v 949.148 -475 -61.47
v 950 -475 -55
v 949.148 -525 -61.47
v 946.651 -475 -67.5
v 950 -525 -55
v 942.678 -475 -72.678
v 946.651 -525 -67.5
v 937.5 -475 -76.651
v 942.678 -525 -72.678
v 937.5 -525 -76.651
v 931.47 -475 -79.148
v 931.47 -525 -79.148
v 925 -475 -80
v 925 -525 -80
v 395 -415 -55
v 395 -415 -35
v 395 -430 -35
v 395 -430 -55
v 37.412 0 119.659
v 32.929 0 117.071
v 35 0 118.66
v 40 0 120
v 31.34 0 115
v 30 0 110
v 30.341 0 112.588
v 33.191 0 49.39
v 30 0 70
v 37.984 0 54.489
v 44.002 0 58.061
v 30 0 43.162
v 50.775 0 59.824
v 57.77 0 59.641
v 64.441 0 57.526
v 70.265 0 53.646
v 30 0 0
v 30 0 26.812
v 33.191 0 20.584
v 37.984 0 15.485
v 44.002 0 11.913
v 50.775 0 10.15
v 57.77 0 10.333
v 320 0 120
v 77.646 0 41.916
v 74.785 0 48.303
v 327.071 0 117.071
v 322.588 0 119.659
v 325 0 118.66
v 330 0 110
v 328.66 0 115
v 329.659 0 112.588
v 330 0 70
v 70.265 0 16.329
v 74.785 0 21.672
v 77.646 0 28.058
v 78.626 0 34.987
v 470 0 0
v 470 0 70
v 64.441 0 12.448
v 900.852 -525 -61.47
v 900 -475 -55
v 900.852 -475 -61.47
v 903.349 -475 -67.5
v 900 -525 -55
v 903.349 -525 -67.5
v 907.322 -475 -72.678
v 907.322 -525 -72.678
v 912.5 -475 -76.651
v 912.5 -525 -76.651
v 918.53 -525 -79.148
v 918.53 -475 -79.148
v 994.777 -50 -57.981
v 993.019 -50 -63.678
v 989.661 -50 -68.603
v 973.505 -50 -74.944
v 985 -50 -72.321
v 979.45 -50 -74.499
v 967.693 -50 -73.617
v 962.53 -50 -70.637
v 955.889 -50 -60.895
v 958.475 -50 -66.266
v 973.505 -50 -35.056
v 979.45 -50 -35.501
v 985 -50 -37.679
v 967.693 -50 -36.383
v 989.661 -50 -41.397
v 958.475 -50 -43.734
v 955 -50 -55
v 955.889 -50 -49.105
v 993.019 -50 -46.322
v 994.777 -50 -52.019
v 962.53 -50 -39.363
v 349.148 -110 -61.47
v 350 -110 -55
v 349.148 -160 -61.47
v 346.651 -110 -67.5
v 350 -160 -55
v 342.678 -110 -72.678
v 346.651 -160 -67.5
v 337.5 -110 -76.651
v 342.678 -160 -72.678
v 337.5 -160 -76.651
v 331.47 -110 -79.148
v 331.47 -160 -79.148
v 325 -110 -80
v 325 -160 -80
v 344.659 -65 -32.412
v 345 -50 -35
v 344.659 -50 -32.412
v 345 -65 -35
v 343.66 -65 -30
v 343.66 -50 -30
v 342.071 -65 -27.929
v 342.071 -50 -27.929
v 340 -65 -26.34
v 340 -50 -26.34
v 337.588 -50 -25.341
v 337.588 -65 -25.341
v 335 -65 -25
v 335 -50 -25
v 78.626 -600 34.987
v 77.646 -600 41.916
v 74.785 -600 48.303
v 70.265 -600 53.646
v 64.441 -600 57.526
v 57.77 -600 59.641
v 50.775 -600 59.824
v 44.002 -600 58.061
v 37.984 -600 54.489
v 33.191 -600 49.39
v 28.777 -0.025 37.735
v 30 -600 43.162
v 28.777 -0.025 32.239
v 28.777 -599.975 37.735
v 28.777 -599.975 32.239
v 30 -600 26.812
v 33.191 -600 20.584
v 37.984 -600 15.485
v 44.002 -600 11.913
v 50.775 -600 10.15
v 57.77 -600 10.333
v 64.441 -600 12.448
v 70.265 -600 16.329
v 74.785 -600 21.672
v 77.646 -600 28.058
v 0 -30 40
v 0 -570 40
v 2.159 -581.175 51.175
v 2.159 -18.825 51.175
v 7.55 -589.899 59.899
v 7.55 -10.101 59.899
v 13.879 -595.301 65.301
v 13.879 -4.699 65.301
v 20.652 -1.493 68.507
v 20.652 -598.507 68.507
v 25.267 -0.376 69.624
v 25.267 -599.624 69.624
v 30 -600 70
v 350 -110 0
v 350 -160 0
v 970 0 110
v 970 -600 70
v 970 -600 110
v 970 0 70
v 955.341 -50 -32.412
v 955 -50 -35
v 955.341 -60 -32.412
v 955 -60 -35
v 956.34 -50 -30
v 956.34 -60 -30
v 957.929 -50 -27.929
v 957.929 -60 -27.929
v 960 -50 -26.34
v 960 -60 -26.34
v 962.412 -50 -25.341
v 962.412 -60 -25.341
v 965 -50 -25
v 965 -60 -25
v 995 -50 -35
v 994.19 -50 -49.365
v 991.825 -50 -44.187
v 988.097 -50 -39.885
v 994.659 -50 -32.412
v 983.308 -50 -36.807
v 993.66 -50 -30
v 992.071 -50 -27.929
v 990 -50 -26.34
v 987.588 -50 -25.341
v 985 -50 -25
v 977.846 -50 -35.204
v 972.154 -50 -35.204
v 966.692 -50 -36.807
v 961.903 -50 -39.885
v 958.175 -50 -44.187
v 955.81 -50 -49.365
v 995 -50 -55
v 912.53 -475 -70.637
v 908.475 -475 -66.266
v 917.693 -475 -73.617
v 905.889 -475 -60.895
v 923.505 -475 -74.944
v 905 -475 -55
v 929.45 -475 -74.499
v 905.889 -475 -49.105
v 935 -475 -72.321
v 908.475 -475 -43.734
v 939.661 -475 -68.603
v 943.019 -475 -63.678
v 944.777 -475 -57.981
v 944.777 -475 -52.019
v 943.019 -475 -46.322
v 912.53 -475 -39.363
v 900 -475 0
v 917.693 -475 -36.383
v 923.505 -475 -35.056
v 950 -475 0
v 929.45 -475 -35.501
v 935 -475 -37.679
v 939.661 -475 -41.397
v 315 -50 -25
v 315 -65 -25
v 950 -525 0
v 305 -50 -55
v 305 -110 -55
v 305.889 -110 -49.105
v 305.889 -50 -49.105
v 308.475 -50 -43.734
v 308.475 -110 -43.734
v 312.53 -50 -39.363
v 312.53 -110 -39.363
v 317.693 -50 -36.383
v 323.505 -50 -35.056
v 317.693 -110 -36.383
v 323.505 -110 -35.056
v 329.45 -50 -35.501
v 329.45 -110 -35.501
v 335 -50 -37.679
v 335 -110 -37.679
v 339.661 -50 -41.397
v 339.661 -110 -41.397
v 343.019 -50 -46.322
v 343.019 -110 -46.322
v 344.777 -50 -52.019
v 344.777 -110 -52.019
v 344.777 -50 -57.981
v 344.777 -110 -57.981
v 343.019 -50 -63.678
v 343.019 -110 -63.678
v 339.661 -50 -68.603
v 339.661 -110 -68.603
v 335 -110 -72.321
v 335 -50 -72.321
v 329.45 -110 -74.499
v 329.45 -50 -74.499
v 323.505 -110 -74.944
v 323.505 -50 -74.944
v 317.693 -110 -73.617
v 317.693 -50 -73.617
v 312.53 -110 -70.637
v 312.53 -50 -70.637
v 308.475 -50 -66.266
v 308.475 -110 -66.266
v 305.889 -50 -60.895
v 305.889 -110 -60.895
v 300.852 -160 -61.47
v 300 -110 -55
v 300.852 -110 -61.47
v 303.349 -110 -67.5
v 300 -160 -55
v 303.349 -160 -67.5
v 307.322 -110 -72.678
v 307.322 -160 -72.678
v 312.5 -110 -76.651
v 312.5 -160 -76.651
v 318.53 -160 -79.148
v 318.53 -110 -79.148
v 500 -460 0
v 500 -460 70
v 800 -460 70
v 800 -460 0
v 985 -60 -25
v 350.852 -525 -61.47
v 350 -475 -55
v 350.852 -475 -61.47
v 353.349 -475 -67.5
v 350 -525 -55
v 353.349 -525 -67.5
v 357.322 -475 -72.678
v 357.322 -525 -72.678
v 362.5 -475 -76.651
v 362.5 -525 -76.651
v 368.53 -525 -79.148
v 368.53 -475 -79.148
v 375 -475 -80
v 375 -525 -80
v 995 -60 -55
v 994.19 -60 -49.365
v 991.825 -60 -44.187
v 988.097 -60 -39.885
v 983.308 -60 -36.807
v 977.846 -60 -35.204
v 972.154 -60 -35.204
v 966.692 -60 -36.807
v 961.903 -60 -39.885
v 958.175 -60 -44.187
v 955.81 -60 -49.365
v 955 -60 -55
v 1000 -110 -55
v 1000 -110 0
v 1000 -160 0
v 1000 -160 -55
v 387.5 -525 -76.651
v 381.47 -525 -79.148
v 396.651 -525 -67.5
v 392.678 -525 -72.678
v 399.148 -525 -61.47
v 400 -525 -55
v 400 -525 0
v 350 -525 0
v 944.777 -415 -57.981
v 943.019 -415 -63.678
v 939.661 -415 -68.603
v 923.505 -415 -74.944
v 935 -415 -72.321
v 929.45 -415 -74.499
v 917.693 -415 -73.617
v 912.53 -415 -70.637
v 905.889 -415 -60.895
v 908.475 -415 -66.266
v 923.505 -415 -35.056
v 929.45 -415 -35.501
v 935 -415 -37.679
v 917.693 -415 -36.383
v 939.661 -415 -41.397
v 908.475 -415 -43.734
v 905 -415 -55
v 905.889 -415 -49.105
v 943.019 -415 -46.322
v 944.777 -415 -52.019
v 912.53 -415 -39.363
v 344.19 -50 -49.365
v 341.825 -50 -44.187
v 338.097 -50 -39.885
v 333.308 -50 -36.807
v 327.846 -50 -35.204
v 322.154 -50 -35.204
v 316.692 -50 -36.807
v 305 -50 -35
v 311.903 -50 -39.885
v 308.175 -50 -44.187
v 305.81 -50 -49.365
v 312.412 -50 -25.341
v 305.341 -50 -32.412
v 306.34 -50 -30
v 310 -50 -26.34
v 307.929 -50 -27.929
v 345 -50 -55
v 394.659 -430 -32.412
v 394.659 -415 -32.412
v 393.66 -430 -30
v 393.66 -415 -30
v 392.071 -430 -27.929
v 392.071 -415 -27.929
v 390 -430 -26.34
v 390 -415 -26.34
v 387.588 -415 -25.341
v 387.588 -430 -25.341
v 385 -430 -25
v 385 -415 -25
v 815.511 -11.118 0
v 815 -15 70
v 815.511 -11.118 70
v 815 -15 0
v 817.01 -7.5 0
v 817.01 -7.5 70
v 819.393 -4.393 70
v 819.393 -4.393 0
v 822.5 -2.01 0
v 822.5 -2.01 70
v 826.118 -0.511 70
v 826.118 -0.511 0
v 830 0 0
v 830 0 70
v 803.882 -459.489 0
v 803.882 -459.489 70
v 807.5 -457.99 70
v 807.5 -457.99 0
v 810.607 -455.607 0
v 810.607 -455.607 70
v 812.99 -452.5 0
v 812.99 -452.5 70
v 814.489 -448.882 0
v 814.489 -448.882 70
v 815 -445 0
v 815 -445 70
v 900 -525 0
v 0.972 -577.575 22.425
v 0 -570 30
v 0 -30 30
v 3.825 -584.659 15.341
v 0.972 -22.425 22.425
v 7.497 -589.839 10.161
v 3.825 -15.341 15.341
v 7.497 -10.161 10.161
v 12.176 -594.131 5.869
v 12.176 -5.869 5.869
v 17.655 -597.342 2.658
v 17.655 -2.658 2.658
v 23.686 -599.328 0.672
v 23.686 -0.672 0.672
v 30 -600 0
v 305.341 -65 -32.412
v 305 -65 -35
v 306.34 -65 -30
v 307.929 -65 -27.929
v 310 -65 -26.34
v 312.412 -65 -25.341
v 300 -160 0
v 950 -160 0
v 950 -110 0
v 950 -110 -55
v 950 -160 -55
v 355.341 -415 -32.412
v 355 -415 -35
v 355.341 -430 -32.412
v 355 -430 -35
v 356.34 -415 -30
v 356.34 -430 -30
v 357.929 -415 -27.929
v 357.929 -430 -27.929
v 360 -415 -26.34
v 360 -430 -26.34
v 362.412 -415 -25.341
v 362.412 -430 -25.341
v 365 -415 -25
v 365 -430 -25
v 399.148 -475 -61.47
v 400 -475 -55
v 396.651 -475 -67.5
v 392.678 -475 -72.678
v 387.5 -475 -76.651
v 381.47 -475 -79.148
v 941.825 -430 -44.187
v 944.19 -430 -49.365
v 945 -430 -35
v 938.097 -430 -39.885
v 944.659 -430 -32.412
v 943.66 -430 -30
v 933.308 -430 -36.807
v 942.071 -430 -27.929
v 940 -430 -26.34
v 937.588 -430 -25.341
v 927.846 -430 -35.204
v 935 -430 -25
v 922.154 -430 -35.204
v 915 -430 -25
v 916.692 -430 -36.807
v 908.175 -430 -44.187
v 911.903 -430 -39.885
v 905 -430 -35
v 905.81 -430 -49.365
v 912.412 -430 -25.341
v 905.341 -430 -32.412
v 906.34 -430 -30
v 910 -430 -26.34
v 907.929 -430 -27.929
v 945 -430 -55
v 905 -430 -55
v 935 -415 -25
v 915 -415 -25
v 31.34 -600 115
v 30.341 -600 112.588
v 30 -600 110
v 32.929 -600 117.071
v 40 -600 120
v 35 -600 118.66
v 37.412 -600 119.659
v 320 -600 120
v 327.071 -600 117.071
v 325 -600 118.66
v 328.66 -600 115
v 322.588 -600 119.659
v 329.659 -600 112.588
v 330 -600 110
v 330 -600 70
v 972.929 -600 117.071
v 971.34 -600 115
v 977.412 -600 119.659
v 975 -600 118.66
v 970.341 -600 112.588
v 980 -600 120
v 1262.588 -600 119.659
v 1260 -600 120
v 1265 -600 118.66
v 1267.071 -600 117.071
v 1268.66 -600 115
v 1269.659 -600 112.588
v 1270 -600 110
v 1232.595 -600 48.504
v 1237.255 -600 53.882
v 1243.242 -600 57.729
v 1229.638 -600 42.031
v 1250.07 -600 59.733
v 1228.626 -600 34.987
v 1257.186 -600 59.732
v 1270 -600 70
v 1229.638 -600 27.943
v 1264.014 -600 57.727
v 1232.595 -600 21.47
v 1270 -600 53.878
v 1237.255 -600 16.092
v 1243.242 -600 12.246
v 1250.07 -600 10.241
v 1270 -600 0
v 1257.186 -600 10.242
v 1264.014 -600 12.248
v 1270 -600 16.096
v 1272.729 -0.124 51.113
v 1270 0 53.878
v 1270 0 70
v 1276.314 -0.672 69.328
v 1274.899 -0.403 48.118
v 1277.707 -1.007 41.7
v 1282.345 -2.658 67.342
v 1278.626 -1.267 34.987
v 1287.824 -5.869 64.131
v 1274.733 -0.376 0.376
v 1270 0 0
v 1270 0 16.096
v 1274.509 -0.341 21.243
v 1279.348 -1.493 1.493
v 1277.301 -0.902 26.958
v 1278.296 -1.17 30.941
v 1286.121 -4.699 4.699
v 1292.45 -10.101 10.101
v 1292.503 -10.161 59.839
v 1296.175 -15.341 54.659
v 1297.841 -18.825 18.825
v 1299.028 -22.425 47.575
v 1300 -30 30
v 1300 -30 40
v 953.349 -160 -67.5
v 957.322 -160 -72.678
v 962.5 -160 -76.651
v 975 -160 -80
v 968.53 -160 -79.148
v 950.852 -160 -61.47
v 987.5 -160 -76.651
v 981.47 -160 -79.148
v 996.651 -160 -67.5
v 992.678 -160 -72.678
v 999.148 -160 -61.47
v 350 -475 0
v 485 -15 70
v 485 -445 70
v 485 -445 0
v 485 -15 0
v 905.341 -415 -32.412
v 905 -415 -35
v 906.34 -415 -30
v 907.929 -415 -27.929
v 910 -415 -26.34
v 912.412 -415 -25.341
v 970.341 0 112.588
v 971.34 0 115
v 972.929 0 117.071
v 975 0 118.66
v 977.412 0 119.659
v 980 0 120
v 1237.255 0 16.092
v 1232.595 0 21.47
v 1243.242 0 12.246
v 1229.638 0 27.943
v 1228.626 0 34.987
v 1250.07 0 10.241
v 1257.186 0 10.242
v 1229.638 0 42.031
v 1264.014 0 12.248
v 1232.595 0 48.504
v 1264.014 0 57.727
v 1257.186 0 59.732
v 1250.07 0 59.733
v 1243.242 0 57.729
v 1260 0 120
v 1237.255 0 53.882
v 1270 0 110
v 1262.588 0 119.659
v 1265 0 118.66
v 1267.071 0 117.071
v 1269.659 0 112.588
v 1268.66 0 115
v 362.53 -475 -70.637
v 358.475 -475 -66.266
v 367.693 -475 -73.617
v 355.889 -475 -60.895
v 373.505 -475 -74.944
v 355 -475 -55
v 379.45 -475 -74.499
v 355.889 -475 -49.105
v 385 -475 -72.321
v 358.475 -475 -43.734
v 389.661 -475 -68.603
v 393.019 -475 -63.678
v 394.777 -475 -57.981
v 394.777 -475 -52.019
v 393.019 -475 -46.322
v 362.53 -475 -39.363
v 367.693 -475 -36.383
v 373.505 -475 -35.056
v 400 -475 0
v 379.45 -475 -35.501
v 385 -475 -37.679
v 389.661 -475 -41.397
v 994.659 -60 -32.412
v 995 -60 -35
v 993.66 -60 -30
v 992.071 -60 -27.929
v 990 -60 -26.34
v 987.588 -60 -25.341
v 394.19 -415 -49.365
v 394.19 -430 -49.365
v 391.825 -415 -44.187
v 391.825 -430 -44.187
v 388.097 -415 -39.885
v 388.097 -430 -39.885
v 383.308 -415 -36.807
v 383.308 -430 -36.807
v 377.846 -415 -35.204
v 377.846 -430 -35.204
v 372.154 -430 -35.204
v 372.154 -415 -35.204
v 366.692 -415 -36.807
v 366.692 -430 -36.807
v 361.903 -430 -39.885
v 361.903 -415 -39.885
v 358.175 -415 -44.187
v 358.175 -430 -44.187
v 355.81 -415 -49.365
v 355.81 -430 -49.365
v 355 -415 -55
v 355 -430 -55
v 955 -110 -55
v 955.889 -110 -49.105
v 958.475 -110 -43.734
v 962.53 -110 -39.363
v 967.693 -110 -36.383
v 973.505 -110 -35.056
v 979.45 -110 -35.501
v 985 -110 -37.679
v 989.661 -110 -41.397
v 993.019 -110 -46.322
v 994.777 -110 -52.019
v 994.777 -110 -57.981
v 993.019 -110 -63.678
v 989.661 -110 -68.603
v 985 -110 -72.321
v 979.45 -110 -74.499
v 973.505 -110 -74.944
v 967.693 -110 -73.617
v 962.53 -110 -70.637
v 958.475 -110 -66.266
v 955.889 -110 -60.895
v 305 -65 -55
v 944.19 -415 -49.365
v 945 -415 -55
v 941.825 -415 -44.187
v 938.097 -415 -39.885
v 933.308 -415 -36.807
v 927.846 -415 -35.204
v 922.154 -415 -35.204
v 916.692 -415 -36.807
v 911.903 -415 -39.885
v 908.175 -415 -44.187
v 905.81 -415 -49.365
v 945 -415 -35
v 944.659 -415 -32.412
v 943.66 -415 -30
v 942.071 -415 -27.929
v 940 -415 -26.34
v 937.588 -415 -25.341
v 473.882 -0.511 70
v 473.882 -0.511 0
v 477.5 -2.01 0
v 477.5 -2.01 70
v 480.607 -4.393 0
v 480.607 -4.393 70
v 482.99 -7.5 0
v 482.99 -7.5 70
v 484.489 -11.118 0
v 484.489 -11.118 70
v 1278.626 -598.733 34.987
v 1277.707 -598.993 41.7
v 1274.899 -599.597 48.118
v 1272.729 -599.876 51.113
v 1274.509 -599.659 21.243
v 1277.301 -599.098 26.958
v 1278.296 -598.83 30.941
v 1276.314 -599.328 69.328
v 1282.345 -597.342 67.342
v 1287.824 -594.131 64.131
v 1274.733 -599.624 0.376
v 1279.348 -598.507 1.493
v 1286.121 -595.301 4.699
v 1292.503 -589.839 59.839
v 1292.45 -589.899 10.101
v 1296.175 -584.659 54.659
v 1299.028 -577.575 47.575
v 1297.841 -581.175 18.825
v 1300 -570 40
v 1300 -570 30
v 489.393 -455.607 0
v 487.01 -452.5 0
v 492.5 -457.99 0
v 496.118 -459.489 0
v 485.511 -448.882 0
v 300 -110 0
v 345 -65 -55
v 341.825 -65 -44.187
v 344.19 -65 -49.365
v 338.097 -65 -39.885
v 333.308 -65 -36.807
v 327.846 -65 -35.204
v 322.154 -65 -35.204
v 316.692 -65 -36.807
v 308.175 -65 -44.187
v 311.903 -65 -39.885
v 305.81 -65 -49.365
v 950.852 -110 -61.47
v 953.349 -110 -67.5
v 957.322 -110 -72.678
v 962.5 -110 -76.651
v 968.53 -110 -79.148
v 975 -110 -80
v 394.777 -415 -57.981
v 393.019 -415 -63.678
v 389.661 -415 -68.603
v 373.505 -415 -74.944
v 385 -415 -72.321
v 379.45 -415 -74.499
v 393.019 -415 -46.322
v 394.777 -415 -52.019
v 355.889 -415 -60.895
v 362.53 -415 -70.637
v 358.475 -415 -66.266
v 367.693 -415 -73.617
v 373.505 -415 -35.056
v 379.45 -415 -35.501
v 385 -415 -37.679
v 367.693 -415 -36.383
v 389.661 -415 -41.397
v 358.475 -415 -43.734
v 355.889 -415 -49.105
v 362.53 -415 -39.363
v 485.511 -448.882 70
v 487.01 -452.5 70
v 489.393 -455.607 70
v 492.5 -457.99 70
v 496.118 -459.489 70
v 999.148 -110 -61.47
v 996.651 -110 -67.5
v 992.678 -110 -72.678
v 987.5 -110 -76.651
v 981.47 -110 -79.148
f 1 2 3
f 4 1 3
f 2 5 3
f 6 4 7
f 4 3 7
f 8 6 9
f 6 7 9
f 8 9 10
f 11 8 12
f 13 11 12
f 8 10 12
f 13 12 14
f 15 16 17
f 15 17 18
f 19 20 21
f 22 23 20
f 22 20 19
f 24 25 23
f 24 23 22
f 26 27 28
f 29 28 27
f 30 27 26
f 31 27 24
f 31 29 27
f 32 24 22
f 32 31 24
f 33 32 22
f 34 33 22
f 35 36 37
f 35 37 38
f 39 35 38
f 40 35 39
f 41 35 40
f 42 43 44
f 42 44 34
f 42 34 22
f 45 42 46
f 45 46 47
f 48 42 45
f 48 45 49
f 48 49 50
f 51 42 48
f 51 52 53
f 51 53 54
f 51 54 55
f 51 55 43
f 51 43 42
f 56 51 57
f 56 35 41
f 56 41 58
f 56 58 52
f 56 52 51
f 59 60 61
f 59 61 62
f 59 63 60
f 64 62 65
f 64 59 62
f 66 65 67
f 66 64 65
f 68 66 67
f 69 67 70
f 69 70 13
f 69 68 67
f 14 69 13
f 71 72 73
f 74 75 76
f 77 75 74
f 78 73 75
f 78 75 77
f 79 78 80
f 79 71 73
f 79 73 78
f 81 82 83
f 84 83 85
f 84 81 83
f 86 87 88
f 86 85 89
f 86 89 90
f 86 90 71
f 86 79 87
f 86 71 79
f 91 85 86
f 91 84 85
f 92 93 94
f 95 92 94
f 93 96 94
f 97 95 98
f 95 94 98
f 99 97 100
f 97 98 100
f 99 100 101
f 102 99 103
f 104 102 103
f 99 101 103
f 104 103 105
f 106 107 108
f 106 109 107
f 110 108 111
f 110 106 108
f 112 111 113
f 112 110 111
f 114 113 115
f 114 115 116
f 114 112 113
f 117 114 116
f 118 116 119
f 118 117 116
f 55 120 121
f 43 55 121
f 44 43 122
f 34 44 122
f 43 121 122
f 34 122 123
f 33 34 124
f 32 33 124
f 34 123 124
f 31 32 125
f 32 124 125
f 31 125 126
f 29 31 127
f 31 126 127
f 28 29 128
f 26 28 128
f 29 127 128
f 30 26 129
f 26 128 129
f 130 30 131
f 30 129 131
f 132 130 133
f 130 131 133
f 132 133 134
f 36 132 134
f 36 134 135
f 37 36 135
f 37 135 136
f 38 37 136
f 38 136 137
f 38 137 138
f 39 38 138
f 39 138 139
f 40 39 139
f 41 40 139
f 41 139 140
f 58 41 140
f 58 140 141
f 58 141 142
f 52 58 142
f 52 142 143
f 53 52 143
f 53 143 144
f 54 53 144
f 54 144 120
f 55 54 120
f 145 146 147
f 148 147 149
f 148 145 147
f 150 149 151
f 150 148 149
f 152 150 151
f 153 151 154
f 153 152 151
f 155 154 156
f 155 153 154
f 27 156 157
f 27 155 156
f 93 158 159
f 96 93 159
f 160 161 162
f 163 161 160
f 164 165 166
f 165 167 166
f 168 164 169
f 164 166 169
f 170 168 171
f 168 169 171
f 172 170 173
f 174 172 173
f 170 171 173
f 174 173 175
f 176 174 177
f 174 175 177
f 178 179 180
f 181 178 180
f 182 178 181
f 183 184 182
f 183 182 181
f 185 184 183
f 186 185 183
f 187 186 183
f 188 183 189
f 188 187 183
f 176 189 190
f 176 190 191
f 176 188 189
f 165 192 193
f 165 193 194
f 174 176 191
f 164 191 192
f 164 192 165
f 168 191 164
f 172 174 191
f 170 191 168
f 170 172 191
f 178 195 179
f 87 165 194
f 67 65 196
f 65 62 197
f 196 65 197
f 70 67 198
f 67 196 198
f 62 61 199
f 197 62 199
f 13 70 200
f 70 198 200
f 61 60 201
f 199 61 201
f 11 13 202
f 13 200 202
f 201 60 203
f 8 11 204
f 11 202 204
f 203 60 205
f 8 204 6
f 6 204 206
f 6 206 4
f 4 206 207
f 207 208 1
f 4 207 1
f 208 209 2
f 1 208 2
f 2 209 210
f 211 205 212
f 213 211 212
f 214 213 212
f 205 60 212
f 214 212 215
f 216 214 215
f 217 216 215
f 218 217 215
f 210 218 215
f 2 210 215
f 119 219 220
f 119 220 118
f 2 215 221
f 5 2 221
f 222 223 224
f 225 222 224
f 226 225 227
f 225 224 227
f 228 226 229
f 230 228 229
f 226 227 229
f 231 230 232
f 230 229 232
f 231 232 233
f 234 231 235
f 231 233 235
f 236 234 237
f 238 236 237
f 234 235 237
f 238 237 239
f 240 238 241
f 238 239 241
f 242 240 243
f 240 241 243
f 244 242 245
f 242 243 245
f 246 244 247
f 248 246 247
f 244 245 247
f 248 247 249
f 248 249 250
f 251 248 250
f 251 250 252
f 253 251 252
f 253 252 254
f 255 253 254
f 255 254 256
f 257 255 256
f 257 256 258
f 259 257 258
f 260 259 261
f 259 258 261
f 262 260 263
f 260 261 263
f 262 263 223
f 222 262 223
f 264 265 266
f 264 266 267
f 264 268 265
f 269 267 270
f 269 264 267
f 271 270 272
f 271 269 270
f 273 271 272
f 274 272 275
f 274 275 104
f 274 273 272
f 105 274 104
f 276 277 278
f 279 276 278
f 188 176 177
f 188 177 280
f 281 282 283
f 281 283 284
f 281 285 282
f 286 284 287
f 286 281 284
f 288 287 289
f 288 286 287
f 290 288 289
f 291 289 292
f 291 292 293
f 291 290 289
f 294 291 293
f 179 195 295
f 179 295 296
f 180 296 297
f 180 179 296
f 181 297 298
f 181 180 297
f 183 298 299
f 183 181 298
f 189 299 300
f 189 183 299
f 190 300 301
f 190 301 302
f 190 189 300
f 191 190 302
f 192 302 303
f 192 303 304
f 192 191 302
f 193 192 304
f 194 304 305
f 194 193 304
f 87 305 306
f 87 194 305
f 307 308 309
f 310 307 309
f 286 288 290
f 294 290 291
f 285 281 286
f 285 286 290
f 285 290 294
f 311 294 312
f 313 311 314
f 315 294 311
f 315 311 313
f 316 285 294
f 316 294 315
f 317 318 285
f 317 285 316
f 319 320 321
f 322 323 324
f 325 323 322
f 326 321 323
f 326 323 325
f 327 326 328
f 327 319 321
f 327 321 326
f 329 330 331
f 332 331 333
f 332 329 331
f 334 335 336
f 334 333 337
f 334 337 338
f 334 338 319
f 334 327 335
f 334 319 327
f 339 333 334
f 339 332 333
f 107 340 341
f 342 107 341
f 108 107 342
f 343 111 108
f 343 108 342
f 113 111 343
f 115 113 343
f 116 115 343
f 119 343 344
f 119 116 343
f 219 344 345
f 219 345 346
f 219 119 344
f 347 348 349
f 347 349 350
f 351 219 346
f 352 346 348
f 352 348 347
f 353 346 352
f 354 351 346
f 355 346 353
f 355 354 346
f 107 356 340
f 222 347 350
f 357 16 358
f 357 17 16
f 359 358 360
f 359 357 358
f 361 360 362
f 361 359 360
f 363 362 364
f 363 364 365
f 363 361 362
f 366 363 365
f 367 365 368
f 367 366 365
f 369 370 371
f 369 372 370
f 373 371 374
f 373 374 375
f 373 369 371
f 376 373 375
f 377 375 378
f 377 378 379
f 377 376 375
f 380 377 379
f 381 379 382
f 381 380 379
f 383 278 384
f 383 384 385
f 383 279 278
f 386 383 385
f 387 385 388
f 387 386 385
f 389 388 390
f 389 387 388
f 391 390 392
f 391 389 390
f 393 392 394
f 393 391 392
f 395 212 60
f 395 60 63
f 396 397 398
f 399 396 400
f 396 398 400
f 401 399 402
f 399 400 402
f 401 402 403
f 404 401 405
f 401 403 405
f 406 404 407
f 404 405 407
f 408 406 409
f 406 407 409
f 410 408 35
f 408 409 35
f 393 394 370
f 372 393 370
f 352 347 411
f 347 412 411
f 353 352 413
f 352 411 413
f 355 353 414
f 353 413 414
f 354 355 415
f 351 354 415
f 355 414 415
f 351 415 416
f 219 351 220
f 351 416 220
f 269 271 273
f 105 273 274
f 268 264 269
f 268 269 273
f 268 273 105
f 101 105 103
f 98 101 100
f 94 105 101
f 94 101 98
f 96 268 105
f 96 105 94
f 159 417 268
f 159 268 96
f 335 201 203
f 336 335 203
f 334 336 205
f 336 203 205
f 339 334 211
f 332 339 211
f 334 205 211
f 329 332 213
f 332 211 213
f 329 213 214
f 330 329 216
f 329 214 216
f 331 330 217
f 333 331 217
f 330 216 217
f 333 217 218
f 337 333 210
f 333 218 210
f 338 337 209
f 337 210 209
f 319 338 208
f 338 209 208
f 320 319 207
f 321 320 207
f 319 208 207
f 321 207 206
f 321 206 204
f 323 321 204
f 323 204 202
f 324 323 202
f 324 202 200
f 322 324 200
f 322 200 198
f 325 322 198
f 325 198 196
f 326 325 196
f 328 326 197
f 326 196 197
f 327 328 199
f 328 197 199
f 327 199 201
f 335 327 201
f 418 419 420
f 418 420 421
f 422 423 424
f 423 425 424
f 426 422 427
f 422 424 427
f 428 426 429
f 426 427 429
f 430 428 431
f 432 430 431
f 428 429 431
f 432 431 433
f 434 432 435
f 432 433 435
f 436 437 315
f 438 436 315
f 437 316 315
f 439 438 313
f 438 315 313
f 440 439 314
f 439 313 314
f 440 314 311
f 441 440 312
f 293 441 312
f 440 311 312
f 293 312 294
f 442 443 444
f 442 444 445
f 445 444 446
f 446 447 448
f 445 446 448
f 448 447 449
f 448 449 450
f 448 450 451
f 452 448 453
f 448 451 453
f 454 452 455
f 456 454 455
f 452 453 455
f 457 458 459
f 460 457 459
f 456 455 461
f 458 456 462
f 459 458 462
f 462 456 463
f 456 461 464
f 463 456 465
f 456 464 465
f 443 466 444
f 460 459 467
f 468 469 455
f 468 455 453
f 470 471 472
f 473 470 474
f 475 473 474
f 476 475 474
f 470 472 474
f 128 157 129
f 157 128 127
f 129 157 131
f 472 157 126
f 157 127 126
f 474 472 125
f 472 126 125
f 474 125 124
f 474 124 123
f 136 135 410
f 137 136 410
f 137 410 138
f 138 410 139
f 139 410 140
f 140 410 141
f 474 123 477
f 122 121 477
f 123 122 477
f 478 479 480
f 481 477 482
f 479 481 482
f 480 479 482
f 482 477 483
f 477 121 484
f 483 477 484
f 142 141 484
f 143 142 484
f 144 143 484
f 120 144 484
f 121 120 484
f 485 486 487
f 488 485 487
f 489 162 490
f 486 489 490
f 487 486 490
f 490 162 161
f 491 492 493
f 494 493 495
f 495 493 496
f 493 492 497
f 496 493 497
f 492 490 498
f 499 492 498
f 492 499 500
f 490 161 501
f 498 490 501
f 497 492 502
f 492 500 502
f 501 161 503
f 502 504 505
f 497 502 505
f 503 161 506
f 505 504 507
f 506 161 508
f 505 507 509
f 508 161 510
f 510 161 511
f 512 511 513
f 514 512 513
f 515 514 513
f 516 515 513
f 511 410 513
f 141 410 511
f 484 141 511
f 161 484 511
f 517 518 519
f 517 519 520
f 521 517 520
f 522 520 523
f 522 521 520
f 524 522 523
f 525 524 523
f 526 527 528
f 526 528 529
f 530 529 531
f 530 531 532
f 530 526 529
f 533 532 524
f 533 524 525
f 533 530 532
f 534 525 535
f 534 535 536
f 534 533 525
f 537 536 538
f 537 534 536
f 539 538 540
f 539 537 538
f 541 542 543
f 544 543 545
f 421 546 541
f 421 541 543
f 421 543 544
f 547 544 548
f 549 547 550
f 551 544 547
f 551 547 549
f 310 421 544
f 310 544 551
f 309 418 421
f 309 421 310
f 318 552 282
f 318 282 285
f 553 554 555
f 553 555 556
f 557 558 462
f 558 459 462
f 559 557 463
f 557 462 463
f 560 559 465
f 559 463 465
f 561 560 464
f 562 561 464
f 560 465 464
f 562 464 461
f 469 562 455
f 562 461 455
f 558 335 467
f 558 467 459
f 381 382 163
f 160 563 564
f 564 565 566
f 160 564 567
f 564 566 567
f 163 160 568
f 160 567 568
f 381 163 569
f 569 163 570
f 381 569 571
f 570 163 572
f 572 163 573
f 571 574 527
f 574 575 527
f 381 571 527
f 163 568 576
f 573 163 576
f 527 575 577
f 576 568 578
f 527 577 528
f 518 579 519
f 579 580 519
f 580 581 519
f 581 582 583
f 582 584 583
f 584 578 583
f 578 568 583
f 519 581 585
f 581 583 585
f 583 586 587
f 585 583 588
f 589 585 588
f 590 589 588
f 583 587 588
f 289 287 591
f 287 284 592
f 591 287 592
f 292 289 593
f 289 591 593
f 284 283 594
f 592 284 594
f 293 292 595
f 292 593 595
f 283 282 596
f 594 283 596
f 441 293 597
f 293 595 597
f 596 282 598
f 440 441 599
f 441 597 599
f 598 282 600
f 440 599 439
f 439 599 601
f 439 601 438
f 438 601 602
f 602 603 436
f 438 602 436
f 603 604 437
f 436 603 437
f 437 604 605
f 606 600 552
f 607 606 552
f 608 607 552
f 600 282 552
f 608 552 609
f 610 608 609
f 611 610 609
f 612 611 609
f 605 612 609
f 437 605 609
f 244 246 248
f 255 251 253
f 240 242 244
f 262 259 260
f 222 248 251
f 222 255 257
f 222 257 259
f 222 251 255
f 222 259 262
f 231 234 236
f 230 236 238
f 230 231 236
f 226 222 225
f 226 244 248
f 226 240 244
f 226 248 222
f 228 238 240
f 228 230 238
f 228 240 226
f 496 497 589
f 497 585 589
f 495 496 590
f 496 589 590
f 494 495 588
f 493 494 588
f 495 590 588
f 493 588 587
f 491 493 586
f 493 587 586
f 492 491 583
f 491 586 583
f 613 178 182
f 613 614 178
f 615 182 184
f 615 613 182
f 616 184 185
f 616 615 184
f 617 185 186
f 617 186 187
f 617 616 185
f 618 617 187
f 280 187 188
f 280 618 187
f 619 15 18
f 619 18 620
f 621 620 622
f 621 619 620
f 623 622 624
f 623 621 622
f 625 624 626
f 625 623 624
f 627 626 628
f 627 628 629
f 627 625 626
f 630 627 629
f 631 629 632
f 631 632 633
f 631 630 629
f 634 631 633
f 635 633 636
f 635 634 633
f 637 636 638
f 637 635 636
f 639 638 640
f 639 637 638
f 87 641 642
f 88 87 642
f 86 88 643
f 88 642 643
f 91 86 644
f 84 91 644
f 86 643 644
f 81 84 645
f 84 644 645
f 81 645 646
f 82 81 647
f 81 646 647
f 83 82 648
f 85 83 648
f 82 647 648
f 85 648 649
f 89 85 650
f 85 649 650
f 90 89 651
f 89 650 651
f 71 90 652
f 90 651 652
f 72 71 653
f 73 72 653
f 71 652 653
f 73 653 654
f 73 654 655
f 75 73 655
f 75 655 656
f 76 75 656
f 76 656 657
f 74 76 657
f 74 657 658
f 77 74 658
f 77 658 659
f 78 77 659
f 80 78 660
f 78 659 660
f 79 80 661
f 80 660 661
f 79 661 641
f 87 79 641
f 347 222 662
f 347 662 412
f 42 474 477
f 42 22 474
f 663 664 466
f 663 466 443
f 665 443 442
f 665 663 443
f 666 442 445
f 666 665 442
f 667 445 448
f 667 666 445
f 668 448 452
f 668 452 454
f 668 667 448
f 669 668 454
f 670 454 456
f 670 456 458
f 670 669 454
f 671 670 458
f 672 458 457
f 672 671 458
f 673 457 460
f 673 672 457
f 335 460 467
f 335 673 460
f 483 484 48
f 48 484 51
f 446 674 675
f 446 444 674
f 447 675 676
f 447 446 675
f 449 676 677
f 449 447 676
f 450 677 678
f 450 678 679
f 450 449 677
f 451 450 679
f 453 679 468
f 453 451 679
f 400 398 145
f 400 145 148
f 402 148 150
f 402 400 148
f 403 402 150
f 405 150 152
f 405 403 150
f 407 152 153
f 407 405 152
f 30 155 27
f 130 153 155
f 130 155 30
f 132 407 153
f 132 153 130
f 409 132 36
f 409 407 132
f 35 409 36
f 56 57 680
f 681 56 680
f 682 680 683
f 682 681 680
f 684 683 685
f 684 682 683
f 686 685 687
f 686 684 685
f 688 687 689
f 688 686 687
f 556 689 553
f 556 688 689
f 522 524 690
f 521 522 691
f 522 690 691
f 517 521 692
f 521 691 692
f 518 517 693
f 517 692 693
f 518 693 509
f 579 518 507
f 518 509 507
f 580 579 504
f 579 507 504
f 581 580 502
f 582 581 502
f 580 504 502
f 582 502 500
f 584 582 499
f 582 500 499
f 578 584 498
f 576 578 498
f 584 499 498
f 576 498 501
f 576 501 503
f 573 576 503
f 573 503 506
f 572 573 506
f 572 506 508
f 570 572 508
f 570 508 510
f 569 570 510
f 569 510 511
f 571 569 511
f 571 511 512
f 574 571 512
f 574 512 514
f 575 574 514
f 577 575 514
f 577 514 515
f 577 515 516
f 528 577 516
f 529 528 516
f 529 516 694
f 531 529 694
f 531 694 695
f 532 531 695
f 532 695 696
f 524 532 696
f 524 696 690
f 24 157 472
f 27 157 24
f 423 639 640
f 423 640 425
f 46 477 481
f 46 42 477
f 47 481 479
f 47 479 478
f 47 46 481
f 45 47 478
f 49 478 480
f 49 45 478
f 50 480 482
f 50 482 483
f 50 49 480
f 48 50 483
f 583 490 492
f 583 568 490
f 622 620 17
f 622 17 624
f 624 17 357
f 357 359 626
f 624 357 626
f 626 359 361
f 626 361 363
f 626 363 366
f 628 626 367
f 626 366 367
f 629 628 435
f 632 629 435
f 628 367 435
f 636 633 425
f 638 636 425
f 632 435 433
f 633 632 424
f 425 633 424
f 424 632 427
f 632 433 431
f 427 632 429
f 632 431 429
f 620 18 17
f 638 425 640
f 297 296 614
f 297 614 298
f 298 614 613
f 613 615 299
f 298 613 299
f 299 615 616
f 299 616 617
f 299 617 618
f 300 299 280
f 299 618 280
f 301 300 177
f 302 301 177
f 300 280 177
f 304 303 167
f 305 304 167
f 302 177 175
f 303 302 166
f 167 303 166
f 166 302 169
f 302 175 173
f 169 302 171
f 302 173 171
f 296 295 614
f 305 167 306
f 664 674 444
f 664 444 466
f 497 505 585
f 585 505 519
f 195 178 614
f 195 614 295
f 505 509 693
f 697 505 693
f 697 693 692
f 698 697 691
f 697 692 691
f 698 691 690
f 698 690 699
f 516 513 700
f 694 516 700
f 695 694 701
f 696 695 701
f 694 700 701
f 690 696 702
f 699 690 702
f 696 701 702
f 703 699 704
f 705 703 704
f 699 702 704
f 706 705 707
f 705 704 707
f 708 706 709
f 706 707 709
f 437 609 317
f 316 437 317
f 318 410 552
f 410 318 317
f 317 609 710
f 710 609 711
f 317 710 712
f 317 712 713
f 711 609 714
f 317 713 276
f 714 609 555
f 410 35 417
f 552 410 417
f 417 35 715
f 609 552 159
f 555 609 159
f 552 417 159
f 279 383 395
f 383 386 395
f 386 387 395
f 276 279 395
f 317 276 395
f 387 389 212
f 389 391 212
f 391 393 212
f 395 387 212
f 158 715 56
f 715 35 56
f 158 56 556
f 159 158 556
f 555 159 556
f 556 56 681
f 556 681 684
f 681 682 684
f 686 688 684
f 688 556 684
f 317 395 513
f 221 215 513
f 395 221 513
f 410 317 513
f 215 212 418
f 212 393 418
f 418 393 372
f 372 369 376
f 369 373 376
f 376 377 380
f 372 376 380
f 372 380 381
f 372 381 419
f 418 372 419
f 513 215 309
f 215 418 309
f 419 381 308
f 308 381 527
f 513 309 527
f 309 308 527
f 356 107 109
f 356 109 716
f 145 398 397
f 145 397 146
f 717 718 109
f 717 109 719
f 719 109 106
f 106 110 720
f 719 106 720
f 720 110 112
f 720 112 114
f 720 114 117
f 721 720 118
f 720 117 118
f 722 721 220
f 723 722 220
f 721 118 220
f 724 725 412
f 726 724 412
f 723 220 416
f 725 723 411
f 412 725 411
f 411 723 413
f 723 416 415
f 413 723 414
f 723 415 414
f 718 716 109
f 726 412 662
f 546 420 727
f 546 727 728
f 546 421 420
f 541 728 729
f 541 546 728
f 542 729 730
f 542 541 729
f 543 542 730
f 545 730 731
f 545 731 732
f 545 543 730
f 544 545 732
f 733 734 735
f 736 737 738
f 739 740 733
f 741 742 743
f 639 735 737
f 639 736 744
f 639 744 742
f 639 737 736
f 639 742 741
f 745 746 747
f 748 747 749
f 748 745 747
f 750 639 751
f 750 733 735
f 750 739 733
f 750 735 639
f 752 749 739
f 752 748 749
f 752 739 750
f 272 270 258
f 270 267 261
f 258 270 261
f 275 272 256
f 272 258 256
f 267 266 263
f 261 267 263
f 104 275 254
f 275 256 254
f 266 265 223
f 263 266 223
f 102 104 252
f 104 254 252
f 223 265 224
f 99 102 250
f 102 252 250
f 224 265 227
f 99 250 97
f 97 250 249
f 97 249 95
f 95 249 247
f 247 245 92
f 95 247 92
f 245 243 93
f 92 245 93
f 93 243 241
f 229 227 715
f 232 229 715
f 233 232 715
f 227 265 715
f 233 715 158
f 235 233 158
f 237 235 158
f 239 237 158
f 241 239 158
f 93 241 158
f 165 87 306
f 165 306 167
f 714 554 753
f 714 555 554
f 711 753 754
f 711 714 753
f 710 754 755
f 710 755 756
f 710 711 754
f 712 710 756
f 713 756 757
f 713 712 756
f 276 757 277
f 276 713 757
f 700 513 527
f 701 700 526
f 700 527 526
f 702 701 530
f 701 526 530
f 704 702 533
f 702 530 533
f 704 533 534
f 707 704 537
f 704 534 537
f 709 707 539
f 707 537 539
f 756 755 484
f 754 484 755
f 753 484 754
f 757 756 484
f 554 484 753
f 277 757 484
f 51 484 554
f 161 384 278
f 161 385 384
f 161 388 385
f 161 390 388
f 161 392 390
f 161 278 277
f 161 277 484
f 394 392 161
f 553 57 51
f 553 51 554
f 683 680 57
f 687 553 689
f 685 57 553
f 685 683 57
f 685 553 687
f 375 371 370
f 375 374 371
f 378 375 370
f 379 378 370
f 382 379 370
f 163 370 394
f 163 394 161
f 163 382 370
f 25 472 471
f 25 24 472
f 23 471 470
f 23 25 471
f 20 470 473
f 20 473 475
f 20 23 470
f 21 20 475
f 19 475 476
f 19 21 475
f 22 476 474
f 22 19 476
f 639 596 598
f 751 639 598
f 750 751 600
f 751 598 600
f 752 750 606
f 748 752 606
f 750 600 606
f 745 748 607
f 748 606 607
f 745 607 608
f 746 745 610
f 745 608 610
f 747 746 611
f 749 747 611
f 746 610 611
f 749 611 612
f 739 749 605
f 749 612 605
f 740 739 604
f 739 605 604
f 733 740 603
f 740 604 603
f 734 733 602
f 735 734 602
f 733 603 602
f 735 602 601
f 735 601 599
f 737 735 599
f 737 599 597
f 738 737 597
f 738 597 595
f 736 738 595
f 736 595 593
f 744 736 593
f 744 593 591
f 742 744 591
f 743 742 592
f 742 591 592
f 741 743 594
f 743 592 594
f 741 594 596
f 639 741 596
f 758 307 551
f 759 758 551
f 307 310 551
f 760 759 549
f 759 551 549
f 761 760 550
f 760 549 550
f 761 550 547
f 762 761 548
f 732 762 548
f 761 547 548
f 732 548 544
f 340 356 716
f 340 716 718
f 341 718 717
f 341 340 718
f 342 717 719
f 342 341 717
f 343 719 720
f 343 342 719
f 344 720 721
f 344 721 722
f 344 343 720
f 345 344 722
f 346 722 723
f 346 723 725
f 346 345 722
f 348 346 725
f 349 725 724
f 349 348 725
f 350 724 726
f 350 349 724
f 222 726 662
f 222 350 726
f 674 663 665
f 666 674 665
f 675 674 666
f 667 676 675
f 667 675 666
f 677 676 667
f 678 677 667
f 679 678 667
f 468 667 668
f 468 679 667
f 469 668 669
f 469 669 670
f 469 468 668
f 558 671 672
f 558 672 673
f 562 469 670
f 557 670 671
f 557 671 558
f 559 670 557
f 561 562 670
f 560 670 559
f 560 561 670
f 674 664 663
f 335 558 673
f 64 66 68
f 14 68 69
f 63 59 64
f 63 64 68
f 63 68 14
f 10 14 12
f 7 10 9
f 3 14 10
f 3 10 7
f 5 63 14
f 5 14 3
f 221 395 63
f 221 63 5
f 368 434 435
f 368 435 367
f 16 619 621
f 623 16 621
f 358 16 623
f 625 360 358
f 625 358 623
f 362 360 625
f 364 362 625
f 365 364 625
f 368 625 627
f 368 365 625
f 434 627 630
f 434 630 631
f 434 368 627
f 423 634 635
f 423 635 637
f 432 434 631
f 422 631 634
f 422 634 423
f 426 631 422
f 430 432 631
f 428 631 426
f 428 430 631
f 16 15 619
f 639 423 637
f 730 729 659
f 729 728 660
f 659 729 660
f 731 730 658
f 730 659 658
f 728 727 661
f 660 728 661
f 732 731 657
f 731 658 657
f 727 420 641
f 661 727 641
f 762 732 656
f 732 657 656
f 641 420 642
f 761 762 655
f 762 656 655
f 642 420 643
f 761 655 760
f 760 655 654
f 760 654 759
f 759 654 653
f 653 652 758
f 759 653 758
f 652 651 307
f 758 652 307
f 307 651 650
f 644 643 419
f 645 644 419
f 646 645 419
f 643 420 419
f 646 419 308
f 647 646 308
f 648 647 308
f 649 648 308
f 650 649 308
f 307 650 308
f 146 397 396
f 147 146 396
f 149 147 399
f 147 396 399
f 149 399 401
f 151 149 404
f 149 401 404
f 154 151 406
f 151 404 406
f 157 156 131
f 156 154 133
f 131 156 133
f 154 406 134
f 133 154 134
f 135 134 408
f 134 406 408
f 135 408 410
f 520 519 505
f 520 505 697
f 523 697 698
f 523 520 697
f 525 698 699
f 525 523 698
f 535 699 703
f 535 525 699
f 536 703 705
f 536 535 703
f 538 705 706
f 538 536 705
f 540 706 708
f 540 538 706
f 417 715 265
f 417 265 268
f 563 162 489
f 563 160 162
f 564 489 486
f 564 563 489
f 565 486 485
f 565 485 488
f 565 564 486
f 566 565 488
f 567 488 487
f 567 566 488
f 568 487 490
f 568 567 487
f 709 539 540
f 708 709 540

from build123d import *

# Parameters (mm, degrees)
F0_W        = 1300
F0_H        = 70
F1_DEPTH    = 600
F2_R        = 25
F3_DEPTH    = 800
F4_T1_DEPTH = 750
F4_T3_DEPTH = 220
F5_W        = 330
F5_H        = 460
F6_DEPTH    = 100
F7_R        = 15
F8_W        = 50
F8_H        = 50
F9_DEPTH    = 80
F10_R       = 24.99999
F11_R       = 20
F12_DEPTH   = 60
F13_R       = 20
F14_DEPTH   = 60
F15_R       = 20
F16_DEPTH   = 60
F17_R       = 20
F18_DEPTH   = 60
F19_W       = 300
F19_H       = 600
F20_DEPTH   = 50
F21_R       = 10
F23_DEPTH   = 10
F25_DEPTH   = 15
F26_R       = 10
F28_DEPTH   = 15
F30_DEPTH   = 15
F31_R       = 10
F31_2_R     = 10
F31_3_R     = 10


# Not quite as in the source:
# - a fillet or chamfer that OpenCascade refuses, or shapes differently, is made with other operations: its cross-section is extruded or revolved along the edge and cut away or added
# - a fillet or chamfer is up to 0.001 mm smaller than in the source, because OpenCascade refuses the exact size


with BuildPart() as f1:
    # F0 (on Front) → F1 (new body)
    with BuildSketch(Plane.XZ):
        with Locations((650, 35)):
            Rectangle(F0_W, F0_H)
    extrude(amount=F1_DEPTH)

    # F2 (on face) → F3 (cut)
    with BuildSketch(Plane.XZ.offset(600)):
        with Locations((53.6256714825, 34.9870798825)):
            Circle(F2_R)
        with Locations((1253.6256714825, 34.9870798825)):
            Circle(F2_R)
    extrude(amount=-F3_DEPTH, mode=Mode.SUBTRACT)

    # F4: fillet of radius 30 on 8 edges, made by hand

    # F4_s2 → F4_t1 (cut)
    with BuildSketch(Plane.XZ.offset(-75)):
        with BuildLine():
            ThreePointArc((0, 40), (8.7867965644, 61.2132034356), (30, 70))
            Line((30, 70), (0, 70))
            Line((0, 70), (0, 40))
        make_face()
        with BuildLine():
            ThreePointArc((0, 30), (8.7867965644, 8.7867965644), (30, 0))
            Line((30, 0), (0, 0))
            Line((0, 0), (0, 30))
        make_face()
        with BuildLine():
            ThreePointArc((1270, 0), (1291.2132034356, 8.7867965644), (1300, 30))
            Line((1300, 30), (1300, 0))
            Line((1300, 0), (1270, 0))
        make_face()
        with BuildLine():
            ThreePointArc((1270, 70), (1291.2132034356, 61.2132034356), (1300, 40))
            Line((1300, 40), (1300, 70))
            Line((1300, 70), (1270, 70))
        make_face()
    extrude(amount=F4_T1_DEPTH, mode=Mode.SUBTRACT)

    # F4_s4 → F4_t3 (cut)
    with BuildSketch(Plane.XY.offset(-75)):
        with BuildLine():
            ThreePointArc((0, -30), (8.7867965644, -8.7867965644), (30, 0))
            Line((30, 0), (0, 0))
            Line((0, 0), (0, -30))
        make_face()
        with BuildLine():
            ThreePointArc((0, -570), (8.7867965644, -591.2132034356), (30, -600))
            Line((30, -600), (0, -600))
            Line((0, -600), (0, -570))
        make_face()
        with BuildLine():
            ThreePointArc((1270, 0), (1291.2132034356, -8.7867965644), (1300, -30))
            Line((1300, -30), (1300, 0))
            Line((1300, 0), (1270, 0))
        make_face()
        with BuildLine():
            ThreePointArc((1270, -600), (1291.2132034356, -591.2132034356), (1300, -570))
            Line((1300, -570), (1300, -600))
            Line((1300, -600), (1270, -600))
        make_face()
    extrude(amount=F4_T3_DEPTH, mode=Mode.SUBTRACT)

    # F5 (on face) → F6 (cut)
    with BuildSketch(Plane.XY.offset(70)):
        with Locations((650, -230)):
            Rectangle(F5_W, F5_H)
    extrude(amount=-F6_DEPTH, mode=Mode.SUBTRACT)

    # F7
    f7_edges = [f1.edges().sort_by_distance(p)[0] for p in [
        (815, 0, 35),
        (485, 0, 35),
        (485, -460, 35),
        (815, -460, 35),
    ]]
    fillet(f7_edges, radius=F7_R)

    # F8 (on face) → F9 (join)
    with BuildSketch(Plane(origin=(0, 0, 0), x_dir=(1, 0, 0), z_dir=(0, 0, -1))):
        with Locations((375, 500)):
            Rectangle(F8_W, F8_H)
        with Locations((925, 500)):
            Rectangle(F8_W, F8_H)
        with Locations((975, 135)):
            Rectangle(F8_W, F8_H)
        with Locations((325, 135)):
            Rectangle(F8_W, F8_H)
    extrude(amount=F9_DEPTH)

    # F10 (radius 25 in the source; OpenCascade refuses exactly that, so slightly less here)
    f10_edges = [f1.edges().sort_by_distance(p)[0] for p in [
        (350, -500, -80),
        (400, -500, -80),
        (350, -135, -80),
        (300, -135, -80),
        (950, -500, -80),
        (900, -500, -80),
        (950, -135, -80),
        (1000, -135, -80),
    ]]
    fillet(f10_edges, radius=F10_R)

    # F11 (on face) → F12 (join)
    with BuildSketch(Plane(origin=(0, -110, 0), x_dir=(-1, 0, 0), z_dir=(0, 1, 0))):
        with Locations((-975, -55)):
            Circle(F11_R)
    extrude(amount=F12_DEPTH)

    # F13 (on face) → F14 (join)
    with BuildSketch(Plane(origin=(0, -110, 0), x_dir=(-1, 0, 0), z_dir=(0, 1, 0))):
        with Locations((-325, -55)):
            Circle(F13_R)
    extrude(amount=F14_DEPTH)

    # F15 (on face) → F16 (join)
    with BuildSketch(Plane(origin=(0, -475, 0), x_dir=(-1, 0, 0), z_dir=(0, 1, 0))):
        with Locations((-375, -55)):
            Circle(F15_R)
    extrude(amount=F16_DEPTH)

    # F17 (on face) → F18 (join)
    with BuildSketch(Plane(origin=(0, -475, 0), x_dir=(-1, 0, 0), z_dir=(0, 1, 0))):
        with Locations((-925, -55)):
            Circle(F17_R)
    extrude(amount=F18_DEPTH)

    # F19 (on face) → F20 (join)
    with BuildSketch(Plane.XY.offset(70)):
        with Locations((180, -300)):
            Rectangle(F19_W, F19_H)
        with Locations((1120, -300)):
            Rectangle(F19_W, F19_H)
    extrude(amount=F20_DEPTH)

    # F21
    f21_edges = [f1.edges().sort_by_distance(p)[0] for p in [
        (1270, -300, 120),
        (30, -300, 120),
        (330, -300, 120),
        (970, -300, 120),
    ]]
    fillet(f21_edges, radius=F21_R)


with BuildPart() as f23:
    # F22 (on face) → F23 (new body)
    with BuildSketch(Plane(origin=(0, -50, 0), x_dir=(-1, 0, 0), z_dir=(0, 1, 0))):
        with BuildLine():
            Line((-995, -25), (-995, -55))
            ThreePointArc((-995, -55), (-975, -35), (-955, -55))
            Line((-955, -55), (-955, -25))
            Line((-955, -25), (-995, -25))
        make_face()
    extrude(amount=-F23_DEPTH)

    # F26
    f26_edges = [f23.edges().sort_by_distance(p)[0] for p in [
        (995, -55, -25),
        (955, -55, -25),
    ]]
    fillet(f26_edges, radius=F26_R)


with BuildPart() as f25:
    # F24 (on face) → F25 (new body)
    with BuildSketch(Plane(origin=(0, -415, 0), x_dir=(-1, 0, 0), z_dir=(0, 1, 0))):
        with BuildLine():
            Line((-945, -25), (-945, -55))
            ThreePointArc((-945, -55), (-925, -35), (-905, -55))
            Line((-905, -55), (-905, -25))
            Line((-905, -25), (-945, -25))
        make_face()
    extrude(amount=-F25_DEPTH)

    # F31
    f31_edges = [f25.edges().sort_by_distance(p)[0] for p in [
        (905, -422.5, -25),
        (945, -422.5, -25),
    ]]
    fillet(f31_edges, radius=F31_R)


with BuildPart() as f28:
    # F27 (on face) → F28 (new body)
    with BuildSketch(Plane(origin=(0, -50, 0), x_dir=(-1, 0, 0), z_dir=(0, 1, 0))):
        with BuildLine():
            Line((-345, -25), (-345, -55))
            ThreePointArc((-345, -55), (-325, -35), (-305, -55))
            Line((-305, -55), (-305, -25))
            Line((-305, -25), (-345, -25))
        make_face()
    extrude(amount=-F28_DEPTH)

    # F31#2
    f31_2_edges = [f28.edges().sort_by_distance(p)[0] for p in [
        (345, -57.5, -25),
        (305, -57.5, -25),
    ]]
    fillet(f31_2_edges, radius=F31_2_R)


with BuildPart() as f30:
    # F29 (on face) → F30 (new body)
    with BuildSketch(Plane(origin=(0, -415, 0), x_dir=(-1, 0, 0), z_dir=(0, 1, 0))):
        with BuildLine():
            Line((-395, -25), (-395, -55))
            ThreePointArc((-395, -55), (-375, -35), (-355, -55))
            Line((-355, -55), (-355, -25))
            Line((-355, -25), (-395, -25))
        make_face()
    extrude(amount=-F30_DEPTH)

    # F31#3
    f31_3_edges = [f30.edges().sort_by_distance(p)[0] for p in [
        (395, -422.5, -25),
        (355, -422.5, -25),
    ]]
    fillet(f31_3_edges, radius=F31_3_R)


solid = Compound([f1.part, f23.part, f25.part, f28.part, f30.part])
